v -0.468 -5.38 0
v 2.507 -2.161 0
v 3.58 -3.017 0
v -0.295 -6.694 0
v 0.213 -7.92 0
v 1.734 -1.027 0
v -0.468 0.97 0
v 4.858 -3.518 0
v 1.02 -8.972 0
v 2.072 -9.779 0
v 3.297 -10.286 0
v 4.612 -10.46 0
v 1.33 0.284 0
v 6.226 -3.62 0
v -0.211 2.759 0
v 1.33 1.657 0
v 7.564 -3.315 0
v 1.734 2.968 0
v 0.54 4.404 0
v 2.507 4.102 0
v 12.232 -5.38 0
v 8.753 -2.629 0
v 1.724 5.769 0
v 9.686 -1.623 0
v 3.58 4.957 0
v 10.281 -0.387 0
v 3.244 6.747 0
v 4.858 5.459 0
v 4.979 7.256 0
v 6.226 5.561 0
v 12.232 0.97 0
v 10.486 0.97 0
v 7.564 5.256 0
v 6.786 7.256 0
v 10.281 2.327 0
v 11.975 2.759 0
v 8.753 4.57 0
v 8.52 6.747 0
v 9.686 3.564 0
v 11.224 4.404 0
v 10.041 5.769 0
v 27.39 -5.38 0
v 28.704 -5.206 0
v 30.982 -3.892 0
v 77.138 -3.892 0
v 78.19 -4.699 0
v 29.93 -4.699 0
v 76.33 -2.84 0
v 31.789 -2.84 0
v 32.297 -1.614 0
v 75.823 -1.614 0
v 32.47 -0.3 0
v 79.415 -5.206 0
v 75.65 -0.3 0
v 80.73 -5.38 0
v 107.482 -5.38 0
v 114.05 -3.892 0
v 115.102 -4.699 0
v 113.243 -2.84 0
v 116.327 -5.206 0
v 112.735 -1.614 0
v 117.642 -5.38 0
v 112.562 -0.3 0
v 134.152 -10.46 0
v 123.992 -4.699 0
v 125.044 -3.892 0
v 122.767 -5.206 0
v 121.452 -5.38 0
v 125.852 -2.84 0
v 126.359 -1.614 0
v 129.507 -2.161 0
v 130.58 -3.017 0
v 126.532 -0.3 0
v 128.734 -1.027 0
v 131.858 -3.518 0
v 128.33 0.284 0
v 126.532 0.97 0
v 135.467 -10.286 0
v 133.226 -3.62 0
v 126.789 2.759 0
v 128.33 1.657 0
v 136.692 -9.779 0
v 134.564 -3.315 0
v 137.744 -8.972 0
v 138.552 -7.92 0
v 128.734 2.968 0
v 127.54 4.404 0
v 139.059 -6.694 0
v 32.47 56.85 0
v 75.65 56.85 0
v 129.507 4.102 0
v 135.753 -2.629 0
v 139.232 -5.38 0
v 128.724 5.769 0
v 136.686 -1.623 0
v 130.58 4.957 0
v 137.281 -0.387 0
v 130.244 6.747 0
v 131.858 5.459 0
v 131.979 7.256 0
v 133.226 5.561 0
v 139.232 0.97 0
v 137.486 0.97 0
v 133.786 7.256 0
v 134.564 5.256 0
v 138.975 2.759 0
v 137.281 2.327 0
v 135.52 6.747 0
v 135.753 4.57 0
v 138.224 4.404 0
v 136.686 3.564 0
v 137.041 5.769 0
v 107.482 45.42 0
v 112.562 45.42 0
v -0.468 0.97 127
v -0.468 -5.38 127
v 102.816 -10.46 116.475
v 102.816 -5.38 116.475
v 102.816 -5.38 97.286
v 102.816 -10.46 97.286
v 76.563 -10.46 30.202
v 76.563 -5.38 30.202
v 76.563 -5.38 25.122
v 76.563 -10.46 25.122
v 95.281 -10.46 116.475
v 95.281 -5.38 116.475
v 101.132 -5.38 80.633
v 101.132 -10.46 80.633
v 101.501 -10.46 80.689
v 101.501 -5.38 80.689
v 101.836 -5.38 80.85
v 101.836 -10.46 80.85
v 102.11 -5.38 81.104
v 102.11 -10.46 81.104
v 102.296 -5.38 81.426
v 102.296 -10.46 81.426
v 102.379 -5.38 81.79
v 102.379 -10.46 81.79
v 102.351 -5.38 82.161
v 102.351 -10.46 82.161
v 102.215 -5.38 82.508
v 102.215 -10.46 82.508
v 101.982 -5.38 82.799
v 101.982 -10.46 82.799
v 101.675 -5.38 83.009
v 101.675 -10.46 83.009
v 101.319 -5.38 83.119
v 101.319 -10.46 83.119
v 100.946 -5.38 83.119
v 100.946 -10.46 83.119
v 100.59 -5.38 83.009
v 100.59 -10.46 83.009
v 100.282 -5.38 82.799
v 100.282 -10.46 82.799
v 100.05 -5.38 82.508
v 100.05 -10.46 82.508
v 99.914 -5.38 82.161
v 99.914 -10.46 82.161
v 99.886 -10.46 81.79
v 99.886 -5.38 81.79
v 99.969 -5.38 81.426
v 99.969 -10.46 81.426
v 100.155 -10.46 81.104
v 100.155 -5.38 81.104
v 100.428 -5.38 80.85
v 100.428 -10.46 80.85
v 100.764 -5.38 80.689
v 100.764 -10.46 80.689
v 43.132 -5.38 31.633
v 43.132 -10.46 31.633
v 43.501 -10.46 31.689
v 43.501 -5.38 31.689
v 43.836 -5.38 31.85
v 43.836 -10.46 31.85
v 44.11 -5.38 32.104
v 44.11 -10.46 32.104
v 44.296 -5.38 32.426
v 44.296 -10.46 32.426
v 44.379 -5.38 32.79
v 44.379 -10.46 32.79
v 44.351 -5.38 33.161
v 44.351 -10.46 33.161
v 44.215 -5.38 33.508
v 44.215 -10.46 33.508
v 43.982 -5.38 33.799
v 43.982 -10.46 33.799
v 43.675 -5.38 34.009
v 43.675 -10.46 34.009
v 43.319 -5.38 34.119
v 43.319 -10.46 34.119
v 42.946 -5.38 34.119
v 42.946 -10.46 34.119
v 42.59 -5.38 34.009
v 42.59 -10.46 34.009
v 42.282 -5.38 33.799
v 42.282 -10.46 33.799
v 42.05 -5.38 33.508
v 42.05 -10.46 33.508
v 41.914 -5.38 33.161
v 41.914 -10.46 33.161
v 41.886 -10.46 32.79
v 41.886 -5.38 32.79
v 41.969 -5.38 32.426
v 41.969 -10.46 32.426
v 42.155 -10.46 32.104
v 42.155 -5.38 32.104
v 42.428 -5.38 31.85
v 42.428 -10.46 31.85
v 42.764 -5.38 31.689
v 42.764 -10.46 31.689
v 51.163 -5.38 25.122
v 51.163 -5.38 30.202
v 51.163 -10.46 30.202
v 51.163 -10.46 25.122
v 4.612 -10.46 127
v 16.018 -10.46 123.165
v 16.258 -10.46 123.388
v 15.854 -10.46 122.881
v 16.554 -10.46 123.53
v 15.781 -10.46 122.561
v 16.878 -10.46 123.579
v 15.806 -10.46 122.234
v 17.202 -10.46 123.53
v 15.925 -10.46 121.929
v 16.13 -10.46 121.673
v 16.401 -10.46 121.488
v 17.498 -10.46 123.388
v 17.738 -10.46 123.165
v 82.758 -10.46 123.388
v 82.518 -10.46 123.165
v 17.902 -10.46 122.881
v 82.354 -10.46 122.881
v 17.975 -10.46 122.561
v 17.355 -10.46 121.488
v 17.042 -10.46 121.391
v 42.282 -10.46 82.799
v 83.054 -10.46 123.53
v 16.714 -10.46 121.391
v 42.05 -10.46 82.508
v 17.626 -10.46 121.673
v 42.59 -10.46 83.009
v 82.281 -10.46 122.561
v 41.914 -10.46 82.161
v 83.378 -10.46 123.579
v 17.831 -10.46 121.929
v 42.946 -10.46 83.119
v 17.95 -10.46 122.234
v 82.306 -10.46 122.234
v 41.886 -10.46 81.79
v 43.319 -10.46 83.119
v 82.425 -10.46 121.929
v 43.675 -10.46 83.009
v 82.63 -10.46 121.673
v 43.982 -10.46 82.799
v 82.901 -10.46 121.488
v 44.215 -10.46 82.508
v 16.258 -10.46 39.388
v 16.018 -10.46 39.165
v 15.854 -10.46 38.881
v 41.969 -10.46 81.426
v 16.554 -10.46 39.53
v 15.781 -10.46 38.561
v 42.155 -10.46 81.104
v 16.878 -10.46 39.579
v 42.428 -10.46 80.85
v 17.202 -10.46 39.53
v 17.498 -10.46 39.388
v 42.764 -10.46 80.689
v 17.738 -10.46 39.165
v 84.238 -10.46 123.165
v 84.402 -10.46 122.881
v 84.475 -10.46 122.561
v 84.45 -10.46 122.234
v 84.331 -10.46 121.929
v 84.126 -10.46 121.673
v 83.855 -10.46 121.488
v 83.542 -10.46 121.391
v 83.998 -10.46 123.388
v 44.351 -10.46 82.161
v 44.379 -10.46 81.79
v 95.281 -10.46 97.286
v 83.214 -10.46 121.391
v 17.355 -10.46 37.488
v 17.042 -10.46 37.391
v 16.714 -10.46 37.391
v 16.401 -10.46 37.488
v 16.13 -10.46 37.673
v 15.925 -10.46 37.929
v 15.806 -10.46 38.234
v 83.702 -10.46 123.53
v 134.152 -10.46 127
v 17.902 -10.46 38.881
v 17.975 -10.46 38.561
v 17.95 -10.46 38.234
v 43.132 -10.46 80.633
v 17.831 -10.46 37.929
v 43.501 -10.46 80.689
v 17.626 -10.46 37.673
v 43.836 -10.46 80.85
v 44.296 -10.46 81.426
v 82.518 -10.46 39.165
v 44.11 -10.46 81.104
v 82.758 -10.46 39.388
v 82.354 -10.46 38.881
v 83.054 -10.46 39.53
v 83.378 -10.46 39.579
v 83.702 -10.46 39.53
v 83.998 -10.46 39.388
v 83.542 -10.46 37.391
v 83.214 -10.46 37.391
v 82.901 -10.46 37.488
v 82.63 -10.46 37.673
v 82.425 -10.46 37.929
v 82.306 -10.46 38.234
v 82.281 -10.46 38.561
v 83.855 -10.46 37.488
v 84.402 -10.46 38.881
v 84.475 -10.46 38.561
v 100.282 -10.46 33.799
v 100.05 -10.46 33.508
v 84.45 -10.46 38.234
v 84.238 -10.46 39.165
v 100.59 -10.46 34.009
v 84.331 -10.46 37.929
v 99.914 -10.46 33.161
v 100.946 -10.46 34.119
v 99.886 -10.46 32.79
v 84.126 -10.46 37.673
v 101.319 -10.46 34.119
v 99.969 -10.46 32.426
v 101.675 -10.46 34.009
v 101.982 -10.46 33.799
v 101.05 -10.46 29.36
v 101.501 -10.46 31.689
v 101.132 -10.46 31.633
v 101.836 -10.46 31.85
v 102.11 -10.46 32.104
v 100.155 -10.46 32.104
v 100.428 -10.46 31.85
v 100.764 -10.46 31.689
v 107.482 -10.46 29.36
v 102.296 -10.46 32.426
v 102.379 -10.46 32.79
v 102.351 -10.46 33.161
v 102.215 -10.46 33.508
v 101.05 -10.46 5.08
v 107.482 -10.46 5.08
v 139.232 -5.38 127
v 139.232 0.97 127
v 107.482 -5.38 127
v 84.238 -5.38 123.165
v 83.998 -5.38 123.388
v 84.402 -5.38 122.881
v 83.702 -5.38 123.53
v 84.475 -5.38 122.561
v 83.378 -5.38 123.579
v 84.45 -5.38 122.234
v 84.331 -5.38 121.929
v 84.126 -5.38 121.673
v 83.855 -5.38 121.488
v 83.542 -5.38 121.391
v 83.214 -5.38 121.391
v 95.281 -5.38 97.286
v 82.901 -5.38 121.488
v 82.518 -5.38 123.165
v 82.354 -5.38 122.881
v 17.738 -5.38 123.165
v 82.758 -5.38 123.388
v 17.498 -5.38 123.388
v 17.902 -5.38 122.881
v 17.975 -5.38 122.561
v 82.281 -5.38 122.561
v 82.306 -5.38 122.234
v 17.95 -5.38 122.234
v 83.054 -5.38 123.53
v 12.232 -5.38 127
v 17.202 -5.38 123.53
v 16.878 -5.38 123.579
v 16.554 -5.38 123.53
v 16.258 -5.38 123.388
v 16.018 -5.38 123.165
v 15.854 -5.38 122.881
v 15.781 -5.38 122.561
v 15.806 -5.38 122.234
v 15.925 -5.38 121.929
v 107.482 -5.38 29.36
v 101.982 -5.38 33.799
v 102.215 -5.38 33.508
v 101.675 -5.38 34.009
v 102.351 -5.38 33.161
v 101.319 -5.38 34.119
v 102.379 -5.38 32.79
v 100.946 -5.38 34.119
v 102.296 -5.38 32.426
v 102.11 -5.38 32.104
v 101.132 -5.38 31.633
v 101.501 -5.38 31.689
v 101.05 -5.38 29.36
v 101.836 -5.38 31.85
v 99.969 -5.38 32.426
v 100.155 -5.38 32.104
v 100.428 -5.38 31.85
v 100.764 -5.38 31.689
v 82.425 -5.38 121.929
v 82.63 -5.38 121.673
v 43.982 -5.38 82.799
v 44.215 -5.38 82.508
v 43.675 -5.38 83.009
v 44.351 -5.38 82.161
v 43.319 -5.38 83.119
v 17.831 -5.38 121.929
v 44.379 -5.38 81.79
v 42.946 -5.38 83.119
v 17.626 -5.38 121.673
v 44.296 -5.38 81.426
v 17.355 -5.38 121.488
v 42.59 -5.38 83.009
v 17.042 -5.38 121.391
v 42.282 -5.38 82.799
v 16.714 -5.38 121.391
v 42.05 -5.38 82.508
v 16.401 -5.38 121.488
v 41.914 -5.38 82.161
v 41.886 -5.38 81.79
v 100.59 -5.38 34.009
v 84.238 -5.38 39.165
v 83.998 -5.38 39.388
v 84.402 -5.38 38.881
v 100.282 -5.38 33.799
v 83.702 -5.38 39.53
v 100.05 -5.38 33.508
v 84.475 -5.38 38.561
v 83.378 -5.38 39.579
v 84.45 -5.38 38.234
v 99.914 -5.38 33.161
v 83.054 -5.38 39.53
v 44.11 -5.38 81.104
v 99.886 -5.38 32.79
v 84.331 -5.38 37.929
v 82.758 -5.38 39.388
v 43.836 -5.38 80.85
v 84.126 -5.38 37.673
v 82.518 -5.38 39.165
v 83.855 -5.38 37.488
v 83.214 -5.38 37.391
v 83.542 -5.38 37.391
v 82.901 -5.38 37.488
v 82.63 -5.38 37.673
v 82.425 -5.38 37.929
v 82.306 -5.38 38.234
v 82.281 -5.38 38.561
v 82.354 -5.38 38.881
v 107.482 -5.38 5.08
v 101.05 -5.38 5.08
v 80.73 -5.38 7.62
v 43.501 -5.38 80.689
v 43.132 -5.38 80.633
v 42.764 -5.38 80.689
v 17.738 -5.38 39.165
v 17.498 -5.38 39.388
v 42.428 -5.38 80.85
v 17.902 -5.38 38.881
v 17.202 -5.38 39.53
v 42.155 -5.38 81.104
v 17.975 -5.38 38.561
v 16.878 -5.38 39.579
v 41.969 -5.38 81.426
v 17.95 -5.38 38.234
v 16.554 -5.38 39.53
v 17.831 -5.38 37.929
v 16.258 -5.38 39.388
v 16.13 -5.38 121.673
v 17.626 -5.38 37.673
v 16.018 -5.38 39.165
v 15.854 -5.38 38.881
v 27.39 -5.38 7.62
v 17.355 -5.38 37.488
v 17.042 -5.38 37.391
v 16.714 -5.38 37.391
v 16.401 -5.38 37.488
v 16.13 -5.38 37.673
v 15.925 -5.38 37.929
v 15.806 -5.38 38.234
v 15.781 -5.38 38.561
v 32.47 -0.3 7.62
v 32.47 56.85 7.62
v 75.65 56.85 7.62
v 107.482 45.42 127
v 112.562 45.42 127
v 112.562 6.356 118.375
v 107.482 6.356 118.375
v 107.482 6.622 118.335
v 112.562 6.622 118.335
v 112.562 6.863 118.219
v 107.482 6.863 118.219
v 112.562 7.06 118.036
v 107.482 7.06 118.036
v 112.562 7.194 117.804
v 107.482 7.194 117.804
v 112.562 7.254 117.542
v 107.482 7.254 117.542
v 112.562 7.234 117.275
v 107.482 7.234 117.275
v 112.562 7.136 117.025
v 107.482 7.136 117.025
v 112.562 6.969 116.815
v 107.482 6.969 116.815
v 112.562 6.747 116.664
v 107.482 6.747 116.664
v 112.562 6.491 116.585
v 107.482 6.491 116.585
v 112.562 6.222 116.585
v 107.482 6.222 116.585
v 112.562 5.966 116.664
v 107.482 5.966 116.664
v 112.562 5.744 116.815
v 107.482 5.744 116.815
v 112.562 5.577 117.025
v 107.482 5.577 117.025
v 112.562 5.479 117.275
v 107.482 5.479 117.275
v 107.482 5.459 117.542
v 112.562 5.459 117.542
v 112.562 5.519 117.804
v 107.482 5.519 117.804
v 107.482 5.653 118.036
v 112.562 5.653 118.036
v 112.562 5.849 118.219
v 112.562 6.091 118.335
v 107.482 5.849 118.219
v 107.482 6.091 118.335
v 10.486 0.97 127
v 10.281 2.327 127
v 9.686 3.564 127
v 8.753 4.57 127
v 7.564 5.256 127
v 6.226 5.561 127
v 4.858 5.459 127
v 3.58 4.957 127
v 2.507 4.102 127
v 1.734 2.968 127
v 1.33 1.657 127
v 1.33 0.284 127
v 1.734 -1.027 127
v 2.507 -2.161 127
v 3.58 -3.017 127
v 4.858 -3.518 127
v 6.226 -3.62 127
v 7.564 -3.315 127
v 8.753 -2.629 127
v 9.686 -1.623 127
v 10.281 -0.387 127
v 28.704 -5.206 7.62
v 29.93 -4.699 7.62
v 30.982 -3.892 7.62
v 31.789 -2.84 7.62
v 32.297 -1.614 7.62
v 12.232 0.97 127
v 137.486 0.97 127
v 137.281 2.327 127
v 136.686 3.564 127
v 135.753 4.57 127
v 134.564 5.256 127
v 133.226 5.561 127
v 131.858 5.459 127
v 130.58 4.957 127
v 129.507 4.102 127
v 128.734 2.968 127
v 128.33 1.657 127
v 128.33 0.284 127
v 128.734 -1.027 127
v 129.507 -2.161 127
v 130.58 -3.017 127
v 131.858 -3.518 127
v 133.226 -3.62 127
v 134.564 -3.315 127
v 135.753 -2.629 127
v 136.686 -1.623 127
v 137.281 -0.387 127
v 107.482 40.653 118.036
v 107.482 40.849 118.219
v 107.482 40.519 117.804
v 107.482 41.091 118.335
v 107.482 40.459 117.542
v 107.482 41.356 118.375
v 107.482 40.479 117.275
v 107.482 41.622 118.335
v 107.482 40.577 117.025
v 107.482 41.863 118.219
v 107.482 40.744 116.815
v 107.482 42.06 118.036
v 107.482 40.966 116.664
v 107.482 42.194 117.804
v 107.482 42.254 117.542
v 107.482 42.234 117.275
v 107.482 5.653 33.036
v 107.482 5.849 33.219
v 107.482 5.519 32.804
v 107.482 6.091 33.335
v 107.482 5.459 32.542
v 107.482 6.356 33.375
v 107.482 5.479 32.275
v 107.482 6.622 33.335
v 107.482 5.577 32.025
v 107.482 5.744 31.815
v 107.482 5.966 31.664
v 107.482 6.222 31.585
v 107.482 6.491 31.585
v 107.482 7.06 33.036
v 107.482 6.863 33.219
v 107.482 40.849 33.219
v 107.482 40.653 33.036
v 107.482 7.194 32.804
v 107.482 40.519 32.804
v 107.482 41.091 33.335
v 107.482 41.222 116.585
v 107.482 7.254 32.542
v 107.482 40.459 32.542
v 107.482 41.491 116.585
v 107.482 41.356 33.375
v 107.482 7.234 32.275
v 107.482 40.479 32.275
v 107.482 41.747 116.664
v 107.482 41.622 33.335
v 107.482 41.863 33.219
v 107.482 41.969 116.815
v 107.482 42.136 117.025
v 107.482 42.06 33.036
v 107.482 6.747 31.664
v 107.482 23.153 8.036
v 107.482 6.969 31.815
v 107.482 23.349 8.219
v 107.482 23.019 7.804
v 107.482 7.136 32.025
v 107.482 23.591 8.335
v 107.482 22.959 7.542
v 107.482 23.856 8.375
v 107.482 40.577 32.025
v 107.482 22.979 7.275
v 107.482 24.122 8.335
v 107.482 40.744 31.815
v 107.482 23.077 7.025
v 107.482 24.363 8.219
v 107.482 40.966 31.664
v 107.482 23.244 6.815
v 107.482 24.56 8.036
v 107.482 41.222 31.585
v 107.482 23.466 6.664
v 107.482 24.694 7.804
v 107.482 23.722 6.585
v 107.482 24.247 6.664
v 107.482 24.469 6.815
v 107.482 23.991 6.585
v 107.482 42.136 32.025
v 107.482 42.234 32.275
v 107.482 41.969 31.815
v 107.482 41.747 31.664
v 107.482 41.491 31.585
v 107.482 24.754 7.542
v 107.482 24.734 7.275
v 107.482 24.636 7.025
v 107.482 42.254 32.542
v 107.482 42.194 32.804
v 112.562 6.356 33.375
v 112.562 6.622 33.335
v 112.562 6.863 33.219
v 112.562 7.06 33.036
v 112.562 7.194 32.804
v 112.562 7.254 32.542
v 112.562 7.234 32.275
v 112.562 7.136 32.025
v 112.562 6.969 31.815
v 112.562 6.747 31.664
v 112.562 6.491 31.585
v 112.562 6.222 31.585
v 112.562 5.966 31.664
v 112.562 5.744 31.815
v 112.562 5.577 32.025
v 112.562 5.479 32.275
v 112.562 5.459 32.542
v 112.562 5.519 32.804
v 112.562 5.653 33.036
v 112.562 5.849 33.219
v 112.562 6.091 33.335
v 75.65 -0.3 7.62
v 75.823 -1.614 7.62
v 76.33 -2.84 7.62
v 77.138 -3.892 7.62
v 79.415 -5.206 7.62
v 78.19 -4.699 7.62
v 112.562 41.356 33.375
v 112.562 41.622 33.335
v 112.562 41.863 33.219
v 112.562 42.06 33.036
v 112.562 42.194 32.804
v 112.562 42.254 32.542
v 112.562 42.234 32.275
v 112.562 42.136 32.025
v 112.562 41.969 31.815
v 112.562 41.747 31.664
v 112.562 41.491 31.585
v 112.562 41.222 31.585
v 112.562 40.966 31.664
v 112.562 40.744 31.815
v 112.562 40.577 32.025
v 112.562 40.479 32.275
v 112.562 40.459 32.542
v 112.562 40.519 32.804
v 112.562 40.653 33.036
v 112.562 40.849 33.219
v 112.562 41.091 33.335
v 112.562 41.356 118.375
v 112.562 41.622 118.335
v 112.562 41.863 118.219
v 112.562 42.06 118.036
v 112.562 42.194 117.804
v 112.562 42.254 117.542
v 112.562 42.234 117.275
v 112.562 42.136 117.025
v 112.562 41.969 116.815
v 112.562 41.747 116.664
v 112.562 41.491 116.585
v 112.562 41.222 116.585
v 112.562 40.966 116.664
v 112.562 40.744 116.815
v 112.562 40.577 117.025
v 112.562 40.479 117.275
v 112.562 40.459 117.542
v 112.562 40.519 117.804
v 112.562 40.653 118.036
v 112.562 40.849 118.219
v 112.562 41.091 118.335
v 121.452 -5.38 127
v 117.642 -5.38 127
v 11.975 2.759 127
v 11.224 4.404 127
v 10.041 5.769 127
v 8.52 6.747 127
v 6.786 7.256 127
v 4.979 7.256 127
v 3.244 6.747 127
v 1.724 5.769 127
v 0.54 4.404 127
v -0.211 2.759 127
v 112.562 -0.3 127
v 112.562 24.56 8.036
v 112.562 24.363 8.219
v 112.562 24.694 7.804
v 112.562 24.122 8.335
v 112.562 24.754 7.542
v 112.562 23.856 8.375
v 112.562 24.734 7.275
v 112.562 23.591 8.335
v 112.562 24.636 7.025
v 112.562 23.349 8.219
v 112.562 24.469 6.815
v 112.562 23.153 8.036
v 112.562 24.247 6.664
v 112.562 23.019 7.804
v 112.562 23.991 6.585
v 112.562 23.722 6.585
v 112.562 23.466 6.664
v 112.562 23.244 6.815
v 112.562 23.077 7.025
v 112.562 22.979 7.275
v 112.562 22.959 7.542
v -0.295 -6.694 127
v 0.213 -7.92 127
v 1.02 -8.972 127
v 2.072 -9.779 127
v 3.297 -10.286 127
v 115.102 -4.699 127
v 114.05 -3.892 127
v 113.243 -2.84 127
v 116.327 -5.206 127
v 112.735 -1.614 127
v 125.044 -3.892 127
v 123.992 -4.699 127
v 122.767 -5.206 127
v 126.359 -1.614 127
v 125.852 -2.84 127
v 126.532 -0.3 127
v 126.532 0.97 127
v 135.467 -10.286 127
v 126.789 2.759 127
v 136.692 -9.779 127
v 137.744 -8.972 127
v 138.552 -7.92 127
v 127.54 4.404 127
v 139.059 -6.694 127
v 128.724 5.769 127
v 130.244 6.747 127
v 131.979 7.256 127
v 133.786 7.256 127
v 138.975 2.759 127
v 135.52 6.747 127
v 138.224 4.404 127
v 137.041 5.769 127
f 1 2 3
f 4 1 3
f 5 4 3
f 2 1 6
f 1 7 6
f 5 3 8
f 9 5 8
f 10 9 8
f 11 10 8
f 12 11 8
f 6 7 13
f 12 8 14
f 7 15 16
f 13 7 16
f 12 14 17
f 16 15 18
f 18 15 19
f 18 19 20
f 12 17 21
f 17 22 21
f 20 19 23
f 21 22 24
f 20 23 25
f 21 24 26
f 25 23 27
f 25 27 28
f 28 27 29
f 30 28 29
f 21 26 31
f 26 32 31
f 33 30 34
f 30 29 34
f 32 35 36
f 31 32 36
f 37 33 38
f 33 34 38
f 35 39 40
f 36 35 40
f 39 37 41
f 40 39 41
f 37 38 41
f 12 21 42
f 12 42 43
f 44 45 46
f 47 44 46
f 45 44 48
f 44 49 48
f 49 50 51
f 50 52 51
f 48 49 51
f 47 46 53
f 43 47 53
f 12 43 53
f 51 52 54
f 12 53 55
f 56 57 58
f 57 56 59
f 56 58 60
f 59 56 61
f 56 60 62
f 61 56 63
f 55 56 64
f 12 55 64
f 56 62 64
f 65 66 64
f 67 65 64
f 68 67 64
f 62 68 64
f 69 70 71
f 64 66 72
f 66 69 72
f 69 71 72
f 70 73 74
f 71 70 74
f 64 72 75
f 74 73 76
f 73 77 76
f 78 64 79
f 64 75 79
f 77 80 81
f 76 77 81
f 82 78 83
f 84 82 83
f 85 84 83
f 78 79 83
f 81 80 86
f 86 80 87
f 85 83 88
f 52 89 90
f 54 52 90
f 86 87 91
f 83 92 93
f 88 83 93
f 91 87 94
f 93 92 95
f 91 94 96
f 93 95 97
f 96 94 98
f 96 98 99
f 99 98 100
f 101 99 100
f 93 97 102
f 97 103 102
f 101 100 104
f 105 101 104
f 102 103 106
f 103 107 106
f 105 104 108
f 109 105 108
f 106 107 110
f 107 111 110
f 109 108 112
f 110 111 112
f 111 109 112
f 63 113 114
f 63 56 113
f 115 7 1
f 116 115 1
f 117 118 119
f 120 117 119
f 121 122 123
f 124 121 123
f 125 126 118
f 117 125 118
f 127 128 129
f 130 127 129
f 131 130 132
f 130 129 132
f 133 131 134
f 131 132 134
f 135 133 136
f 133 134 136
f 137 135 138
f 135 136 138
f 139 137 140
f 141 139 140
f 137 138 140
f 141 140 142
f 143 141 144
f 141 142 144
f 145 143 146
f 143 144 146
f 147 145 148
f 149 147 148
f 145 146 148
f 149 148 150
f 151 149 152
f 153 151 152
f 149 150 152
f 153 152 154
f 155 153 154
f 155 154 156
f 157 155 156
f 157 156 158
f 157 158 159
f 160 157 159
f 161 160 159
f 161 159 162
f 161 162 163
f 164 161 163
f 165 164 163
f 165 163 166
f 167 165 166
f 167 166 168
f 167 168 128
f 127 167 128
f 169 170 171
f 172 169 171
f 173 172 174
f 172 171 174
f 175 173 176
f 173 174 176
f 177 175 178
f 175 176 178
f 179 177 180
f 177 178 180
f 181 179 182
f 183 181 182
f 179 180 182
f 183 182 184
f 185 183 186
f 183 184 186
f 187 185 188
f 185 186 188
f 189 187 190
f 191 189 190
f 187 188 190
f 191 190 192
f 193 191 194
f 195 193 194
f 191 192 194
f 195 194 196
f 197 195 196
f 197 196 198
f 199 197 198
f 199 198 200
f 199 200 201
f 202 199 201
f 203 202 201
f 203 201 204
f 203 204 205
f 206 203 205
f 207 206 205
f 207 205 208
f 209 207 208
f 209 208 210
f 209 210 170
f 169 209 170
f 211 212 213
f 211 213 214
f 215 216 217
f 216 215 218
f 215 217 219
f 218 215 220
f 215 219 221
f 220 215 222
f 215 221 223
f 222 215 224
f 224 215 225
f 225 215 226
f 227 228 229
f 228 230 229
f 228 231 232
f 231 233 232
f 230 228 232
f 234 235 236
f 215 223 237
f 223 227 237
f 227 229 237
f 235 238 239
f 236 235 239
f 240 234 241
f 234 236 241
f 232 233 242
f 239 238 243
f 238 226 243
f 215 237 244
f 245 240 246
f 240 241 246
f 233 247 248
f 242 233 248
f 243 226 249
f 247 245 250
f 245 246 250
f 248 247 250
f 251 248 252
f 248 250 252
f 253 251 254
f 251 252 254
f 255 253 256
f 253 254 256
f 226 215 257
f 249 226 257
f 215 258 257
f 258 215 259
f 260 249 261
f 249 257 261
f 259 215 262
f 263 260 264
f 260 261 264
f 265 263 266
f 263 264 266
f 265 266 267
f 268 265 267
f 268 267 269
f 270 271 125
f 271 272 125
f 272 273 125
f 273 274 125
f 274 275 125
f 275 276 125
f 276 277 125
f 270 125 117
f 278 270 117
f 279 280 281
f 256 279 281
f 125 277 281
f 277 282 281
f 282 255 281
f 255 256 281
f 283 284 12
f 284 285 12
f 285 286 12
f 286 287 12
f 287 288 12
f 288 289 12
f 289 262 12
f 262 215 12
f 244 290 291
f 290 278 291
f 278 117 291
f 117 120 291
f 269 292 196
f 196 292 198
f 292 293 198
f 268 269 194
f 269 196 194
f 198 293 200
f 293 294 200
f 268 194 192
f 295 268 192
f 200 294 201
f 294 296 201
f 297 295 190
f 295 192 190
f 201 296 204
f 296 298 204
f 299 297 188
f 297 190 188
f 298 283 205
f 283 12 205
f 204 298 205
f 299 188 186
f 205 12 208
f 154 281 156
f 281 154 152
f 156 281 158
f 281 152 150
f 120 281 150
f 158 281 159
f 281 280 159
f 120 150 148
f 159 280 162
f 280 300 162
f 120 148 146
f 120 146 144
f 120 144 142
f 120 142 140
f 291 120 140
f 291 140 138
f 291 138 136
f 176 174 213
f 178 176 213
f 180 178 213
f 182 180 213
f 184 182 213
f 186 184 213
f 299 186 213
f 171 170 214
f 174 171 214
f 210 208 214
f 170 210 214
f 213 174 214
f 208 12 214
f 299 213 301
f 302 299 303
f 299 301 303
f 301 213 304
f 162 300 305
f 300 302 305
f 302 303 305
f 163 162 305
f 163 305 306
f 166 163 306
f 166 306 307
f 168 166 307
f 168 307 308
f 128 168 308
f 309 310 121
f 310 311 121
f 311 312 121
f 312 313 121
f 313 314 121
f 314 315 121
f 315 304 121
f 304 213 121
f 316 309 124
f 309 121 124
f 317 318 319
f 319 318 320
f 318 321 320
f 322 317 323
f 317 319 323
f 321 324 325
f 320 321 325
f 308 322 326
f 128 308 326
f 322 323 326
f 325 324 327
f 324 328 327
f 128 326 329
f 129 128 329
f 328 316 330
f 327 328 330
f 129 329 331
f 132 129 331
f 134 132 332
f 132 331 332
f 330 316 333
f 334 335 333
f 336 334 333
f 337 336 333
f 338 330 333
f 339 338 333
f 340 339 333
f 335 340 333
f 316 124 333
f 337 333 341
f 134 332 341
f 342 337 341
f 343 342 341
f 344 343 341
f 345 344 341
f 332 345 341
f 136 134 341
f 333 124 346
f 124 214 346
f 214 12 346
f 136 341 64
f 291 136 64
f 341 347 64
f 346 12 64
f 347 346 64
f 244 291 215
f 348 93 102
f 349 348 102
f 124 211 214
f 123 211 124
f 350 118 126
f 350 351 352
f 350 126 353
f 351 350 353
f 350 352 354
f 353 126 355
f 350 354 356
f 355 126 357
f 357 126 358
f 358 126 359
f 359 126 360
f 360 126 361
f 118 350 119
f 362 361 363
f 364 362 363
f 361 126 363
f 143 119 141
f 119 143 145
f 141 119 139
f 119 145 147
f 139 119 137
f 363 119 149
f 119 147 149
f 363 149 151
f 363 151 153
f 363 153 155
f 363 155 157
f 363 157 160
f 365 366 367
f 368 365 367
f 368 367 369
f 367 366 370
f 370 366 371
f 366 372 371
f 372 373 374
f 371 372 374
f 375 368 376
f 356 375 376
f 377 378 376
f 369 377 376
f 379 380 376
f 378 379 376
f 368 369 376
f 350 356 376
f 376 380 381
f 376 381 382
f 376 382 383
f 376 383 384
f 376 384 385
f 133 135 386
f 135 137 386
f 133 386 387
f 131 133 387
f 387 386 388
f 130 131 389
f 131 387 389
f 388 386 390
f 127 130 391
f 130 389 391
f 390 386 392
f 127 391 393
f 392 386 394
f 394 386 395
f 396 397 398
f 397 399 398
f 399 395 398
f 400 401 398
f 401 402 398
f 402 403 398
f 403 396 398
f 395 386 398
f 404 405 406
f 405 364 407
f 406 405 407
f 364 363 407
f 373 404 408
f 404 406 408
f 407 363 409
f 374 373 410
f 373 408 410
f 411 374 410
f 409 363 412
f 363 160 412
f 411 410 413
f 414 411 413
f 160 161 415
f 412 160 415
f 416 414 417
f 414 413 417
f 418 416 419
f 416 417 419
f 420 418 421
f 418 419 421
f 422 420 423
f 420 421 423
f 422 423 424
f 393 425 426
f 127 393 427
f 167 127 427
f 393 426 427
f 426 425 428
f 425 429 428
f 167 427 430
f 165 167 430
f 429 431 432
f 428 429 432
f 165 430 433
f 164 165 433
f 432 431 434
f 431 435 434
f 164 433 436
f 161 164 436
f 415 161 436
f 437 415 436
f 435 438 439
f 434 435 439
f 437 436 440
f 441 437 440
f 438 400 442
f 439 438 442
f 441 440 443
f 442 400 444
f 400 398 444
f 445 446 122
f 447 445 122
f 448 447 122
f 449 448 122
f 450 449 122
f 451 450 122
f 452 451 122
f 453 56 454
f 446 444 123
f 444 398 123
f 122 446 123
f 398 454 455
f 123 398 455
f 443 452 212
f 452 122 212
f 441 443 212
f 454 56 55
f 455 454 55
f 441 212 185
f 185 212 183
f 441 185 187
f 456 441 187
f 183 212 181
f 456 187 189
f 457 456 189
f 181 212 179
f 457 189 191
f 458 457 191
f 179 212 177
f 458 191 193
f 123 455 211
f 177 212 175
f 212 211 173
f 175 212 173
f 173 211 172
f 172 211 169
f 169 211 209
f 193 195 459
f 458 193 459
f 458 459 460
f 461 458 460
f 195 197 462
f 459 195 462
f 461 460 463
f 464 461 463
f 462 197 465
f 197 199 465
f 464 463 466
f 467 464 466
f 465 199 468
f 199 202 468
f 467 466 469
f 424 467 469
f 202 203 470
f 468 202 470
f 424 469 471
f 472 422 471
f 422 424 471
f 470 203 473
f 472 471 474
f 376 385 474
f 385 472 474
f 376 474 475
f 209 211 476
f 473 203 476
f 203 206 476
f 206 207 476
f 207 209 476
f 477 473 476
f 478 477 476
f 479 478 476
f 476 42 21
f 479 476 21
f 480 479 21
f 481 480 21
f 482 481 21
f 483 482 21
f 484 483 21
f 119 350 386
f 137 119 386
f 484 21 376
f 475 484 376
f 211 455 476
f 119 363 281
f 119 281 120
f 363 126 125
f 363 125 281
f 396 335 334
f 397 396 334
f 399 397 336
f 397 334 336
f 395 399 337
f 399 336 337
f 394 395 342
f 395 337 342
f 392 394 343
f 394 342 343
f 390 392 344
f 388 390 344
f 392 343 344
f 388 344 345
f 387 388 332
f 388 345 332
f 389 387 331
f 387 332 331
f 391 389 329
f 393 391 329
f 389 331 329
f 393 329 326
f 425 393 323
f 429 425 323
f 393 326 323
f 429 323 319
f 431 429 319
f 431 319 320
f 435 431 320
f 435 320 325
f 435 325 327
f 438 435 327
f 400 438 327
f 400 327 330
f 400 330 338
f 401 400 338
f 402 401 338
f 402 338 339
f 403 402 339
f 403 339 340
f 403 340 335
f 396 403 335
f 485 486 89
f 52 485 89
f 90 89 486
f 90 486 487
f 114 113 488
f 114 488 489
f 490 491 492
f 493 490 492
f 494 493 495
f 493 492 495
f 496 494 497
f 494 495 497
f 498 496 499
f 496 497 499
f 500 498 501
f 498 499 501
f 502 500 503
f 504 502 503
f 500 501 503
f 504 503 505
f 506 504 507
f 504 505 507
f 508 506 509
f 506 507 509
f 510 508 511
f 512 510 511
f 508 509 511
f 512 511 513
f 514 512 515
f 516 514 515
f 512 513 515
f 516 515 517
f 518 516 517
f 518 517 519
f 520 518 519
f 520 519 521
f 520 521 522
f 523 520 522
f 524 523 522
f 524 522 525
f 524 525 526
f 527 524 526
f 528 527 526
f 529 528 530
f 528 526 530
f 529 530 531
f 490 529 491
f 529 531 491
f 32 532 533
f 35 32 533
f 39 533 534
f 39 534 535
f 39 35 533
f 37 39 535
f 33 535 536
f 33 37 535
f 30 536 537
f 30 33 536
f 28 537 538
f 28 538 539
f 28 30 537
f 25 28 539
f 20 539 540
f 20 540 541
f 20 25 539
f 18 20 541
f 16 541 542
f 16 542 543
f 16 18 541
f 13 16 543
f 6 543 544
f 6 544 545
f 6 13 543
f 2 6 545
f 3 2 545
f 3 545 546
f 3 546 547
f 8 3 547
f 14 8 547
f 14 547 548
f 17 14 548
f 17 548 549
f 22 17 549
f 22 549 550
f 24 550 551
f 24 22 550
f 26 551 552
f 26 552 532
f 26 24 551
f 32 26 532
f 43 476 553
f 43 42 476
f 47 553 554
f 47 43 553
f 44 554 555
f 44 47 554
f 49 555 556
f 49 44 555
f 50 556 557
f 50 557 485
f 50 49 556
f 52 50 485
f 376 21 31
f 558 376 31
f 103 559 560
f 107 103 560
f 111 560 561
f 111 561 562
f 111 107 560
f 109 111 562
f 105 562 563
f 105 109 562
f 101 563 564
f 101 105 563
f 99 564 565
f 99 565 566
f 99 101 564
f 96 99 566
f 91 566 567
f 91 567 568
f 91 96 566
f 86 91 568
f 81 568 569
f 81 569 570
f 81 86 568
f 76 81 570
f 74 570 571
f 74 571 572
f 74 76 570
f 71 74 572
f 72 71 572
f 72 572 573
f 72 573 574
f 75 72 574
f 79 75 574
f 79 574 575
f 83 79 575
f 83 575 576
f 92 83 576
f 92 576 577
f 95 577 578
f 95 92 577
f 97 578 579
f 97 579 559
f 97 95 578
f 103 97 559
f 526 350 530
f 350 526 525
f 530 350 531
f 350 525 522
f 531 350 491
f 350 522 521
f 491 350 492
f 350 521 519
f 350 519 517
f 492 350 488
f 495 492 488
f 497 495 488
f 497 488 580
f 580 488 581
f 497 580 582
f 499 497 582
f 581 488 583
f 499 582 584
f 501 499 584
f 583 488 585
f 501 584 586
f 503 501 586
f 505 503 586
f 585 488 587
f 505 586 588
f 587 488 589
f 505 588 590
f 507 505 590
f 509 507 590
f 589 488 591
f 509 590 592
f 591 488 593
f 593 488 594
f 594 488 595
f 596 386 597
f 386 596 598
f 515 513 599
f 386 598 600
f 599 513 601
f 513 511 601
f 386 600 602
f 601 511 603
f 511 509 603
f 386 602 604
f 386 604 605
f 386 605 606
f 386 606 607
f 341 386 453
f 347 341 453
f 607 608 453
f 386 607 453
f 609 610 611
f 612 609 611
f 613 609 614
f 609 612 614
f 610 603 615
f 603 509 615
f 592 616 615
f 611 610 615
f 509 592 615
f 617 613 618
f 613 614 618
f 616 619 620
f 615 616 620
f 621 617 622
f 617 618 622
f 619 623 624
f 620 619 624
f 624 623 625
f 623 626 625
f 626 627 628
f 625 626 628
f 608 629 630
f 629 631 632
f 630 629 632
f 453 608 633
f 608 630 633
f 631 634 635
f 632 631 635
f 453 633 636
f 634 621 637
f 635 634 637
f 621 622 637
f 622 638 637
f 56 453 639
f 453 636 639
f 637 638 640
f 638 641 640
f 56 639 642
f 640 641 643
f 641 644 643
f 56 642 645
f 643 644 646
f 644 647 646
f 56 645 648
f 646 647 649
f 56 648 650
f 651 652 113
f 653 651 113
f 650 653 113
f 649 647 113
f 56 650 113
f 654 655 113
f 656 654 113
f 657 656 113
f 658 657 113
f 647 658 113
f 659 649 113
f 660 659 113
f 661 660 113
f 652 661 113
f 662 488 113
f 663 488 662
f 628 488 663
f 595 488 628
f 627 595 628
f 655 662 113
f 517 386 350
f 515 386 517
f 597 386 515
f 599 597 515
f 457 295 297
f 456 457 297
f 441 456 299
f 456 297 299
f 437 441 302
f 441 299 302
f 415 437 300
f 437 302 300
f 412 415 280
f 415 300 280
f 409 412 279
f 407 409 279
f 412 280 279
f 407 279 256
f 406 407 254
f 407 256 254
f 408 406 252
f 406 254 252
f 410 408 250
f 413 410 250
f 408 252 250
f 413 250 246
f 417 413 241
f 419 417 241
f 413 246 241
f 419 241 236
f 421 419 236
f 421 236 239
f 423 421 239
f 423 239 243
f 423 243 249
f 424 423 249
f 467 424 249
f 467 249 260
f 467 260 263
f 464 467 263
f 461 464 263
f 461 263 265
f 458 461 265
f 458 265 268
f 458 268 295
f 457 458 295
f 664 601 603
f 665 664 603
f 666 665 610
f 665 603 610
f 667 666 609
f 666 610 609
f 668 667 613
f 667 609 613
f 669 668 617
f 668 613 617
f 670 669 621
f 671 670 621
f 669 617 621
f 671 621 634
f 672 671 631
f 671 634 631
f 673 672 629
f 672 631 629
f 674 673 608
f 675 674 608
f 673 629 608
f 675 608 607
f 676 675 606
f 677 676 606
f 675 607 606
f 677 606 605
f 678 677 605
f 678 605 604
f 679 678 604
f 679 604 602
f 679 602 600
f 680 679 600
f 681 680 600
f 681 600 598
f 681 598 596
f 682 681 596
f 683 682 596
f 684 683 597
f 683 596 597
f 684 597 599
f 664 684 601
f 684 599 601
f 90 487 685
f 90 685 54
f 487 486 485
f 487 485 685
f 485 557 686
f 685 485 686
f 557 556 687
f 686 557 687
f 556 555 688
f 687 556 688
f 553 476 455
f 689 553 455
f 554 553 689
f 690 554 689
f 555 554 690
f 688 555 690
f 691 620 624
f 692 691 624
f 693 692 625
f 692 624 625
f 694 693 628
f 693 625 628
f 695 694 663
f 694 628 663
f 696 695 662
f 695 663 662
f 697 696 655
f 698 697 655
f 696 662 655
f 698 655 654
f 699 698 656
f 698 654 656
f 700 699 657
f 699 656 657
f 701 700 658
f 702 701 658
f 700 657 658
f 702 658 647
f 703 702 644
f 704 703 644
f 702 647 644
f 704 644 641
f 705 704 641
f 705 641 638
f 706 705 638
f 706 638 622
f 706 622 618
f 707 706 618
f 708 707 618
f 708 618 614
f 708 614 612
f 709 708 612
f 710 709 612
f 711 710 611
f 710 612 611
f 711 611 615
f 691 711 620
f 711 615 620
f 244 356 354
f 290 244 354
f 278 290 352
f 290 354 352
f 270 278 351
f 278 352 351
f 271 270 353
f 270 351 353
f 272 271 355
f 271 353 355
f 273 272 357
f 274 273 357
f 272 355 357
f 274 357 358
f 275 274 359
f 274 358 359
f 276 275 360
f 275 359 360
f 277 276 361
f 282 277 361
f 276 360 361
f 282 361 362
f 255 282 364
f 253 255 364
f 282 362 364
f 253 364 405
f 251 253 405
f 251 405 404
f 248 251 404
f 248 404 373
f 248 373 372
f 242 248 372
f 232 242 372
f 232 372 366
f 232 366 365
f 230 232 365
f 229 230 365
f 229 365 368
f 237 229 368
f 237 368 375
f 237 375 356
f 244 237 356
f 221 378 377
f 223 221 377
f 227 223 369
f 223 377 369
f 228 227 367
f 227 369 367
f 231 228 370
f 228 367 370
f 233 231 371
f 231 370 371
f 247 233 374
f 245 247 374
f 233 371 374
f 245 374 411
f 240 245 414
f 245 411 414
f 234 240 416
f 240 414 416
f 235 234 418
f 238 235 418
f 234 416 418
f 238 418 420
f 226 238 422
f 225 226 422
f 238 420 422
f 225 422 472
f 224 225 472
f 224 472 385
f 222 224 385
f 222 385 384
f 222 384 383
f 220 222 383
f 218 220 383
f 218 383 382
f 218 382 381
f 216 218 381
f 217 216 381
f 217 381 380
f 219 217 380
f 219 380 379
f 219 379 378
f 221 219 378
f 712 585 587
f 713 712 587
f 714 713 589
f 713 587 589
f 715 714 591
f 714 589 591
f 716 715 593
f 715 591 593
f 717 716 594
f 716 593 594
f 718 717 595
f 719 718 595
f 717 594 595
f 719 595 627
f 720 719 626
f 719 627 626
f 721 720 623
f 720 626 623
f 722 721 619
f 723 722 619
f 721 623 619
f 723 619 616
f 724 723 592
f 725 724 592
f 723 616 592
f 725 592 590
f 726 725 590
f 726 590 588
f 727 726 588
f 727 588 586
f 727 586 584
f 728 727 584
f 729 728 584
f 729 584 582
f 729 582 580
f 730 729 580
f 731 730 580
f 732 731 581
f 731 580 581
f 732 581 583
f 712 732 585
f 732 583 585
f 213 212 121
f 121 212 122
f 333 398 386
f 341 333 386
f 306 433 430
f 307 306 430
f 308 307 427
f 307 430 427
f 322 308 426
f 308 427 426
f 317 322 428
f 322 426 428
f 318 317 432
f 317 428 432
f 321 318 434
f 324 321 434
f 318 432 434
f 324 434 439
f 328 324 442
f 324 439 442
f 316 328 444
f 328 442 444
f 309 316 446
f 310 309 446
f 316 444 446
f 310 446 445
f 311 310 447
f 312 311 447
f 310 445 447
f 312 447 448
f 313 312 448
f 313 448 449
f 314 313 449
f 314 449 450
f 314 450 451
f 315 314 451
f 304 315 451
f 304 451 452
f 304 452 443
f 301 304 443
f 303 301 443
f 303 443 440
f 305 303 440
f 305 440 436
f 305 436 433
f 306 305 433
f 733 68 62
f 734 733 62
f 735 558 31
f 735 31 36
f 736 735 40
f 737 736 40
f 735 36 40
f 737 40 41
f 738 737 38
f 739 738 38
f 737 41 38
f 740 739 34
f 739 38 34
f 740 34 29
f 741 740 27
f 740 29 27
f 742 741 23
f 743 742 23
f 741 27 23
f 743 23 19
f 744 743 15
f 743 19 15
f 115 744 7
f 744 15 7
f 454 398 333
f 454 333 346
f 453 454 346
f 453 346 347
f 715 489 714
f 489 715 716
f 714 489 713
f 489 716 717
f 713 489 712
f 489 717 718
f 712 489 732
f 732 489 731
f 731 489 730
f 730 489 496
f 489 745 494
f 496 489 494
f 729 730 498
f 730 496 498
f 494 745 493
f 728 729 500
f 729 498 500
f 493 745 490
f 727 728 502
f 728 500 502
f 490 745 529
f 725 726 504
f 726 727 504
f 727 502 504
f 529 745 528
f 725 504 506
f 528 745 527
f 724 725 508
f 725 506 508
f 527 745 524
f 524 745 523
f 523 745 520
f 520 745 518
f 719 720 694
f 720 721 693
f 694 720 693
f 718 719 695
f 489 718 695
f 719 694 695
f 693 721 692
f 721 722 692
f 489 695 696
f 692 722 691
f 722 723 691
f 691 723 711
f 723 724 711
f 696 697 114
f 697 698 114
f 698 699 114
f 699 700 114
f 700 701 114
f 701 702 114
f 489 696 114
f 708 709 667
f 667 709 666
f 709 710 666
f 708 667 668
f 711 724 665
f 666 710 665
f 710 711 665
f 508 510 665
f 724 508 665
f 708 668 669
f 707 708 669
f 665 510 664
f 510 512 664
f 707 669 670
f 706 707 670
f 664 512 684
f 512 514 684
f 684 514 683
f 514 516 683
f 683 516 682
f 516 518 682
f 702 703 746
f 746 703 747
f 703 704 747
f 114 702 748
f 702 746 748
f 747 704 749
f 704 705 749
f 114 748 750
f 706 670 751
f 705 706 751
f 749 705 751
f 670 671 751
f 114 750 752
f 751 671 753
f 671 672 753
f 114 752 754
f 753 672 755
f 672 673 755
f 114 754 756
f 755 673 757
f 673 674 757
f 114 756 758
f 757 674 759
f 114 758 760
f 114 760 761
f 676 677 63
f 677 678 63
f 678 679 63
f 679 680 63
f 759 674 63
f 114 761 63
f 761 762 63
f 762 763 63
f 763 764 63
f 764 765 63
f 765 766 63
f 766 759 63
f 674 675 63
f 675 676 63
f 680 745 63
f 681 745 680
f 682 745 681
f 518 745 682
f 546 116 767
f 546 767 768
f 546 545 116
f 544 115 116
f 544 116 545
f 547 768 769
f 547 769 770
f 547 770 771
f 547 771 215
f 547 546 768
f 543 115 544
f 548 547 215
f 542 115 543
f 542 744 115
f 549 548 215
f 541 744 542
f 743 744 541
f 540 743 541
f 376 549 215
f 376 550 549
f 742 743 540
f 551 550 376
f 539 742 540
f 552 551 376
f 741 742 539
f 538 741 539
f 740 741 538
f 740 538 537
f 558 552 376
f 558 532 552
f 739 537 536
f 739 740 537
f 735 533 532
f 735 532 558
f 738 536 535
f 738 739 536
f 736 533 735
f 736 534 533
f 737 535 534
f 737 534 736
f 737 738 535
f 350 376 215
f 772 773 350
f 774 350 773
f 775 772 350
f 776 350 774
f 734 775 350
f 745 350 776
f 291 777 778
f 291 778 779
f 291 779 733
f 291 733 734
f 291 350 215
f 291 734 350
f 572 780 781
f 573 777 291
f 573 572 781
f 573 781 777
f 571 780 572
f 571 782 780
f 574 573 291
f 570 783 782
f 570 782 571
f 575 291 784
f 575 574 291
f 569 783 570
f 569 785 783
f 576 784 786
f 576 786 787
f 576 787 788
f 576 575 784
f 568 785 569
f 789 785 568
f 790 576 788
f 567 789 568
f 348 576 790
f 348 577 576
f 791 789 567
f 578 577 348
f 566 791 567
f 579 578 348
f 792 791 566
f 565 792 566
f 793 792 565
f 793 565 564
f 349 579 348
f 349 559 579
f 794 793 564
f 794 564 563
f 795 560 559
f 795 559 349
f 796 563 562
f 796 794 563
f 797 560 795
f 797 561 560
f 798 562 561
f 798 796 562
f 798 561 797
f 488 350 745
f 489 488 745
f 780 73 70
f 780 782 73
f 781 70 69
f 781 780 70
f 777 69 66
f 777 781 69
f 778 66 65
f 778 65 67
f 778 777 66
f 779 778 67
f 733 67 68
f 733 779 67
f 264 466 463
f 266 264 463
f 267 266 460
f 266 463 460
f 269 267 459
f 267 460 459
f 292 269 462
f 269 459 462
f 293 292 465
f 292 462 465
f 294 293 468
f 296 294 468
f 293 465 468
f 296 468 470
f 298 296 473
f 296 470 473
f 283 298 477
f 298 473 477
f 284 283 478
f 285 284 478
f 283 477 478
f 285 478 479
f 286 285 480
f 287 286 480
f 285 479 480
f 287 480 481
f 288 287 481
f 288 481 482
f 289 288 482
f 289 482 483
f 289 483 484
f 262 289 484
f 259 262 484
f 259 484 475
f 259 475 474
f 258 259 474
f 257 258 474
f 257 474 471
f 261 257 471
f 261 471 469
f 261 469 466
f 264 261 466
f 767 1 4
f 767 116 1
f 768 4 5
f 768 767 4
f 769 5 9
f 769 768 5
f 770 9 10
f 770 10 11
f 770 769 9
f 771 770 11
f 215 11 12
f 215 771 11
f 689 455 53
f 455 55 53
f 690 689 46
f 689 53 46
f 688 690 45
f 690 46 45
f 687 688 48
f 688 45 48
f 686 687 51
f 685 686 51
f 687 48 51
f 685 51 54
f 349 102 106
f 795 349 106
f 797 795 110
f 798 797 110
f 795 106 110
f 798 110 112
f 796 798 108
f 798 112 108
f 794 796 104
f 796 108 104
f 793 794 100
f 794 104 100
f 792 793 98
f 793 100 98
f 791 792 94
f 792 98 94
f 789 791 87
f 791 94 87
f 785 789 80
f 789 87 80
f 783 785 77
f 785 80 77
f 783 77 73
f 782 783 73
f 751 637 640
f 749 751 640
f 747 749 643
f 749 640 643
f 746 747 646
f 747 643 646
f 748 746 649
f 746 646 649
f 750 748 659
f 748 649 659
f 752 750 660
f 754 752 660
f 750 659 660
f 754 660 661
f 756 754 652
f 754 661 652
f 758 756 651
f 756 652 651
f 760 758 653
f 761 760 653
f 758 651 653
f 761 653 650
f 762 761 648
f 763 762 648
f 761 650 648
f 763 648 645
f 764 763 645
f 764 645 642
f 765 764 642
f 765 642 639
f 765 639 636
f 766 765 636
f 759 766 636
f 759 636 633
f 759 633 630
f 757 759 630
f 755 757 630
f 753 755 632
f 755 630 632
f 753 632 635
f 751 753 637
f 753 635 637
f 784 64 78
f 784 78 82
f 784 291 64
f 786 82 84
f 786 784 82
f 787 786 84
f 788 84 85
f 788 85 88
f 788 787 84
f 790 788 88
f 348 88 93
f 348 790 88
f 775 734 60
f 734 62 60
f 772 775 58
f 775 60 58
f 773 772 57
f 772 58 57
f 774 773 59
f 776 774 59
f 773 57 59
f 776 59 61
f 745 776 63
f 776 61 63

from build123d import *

# Parameters (mm, degrees)
SKETCH1_R           = 4.60375
BOSS_EXTRUDE1_DEPTH = 127
SKETCH3_R           = 1.249999967
CUT_EXTRUDE3_DEPTH  = 190.290136172
SKETCH4_R           = 1.1
CUT_EXTRUDE4_DEPTH  = 189.880695817
SKETCH5_W           = 5.08
SKETCH5_H           = 127
BOSS_EXTRUDE2_DEPTH = 50.8
SKETCH6_R           = 0.899999978
CUT_EXTRUDE5_DEPTH  = 5.08
SKETCH7_W           = 6.432611175
SKETCH7_H           = 24.280435839
SKETCH7_W_2         = 25.4
SKETCH7_H_2         = 5.08
SKETCH7_W_3         = 7.534248642
SKETCH7_H_3         = 19.188789511
CUT_EXTRUDE6_DEPTH  = 196.180089282
FILLET1_R           = 5.08
SKETCH8_W           = 43.18
SKETCH8_H           = 7.62
BOSS_EXTRUDE3_DEPTH = 62.23
FILLET2_R           = 5.08


with BuildPart() as part:
    # Sketch1 → Boss-Extrude1 (new body)
    with BuildSketch(Plane.XY):
        with BuildLine():
            Line((-0.467721946, 0.970453027), (-0.467721946, -10.459546973))
            Line((-0.467721946, -10.459546973), (139.232278054, -10.459546973))
            Line((139.232278054, -10.459546973), (139.232278054, 0.970453027))
            ThreePointArc((139.232278054, 0.970453027), (132.882278054, 7.320453027), (126.532278054, 0.970453027))
            Line((126.532278054, 0.970453027), (126.532278054, -5.379546973))
            Line((126.532278054, -5.379546973), (12.232278054, -5.379546973))
            Line((12.232278054, -5.379546973), (12.232278054, 0.970453027))
            ThreePointArc((12.232278054, 0.970453027), (5.882278054, 7.320453027), (-0.467721946, 0.970453027))
        make_face()
        with Locations((5.882278054, 0.970453027)):
            Circle(SKETCH1_R, mode=Mode.SUBTRACT)
        with Locations((132.882278054, 0.970453027)):
            Circle(SKETCH1_R, mode=Mode.SUBTRACT)
    extrude(amount=BOSS_EXTRUDE1_DEPTH)

    # Sketch3 → Cut-Extrude3 (cut, through all)
    with BuildSketch(Plane.XZ.offset(10.459546973)):
        with Locations(Location((101.132278054, 81.883033078, 0), (0, 0, 270))):
            Circle(SKETCH3_R)
        with Locations(Location((43.132278054, 81.883033078, 0), (0, 0, 270))):
            Circle(SKETCH3_R)
        with Locations(Location((43.132278054, 32.883033078, 0), (0, 0, 270))):
            Circle(SKETCH3_R)
        with Locations(Location((101.132278054, 32.883033078, 0), (0, 0, 270))):
            Circle(SKETCH3_R)
    extrude(amount=-CUT_EXTRUDE3_DEPTH, mode=Mode.SUBTRACT)

    # Sketch4 → Cut-Extrude4 (cut, through all)
    with BuildSketch(Plane(origin=(0, -5.379546973, 0), x_dir=(1, 0, 0), z_dir=(0, 1, 0))):
        with Locations(Location((16.877982827, -38.47904026, 0), (0, 0, 270))):
            Circle(SKETCH4_R)
        with Locations(Location((16.877982827, -122.479040154, 0), (0, 0, 270))):
            Circle(SKETCH4_R)
        with Locations(Location((83.377982923, -38.47904026, 0), (0, 0, 270))):
            Circle(SKETCH4_R)
        with Locations(Location((83.377982923, -122.479040154, 0), (0, 0, 270))):
            Circle(SKETCH4_R)
    extrude(amount=-CUT_EXTRUDE4_DEPTH, mode=Mode.SUBTRACT)

    # Sketch5 → Boss-Extrude2 (add)
    with BuildSketch(Plane(origin=(0, -5.379546973, 0), x_dir=(1, 0, 0), z_dir=(0, 1, 0))):
        with Locations((110.022278054, -63.5)):
            Rectangle(SKETCH5_W, SKETCH5_H)
    extrude(amount=BOSS_EXTRUDE2_DEPTH)

    # Sketch6 → Cut-Extrude5 (cut)
    with BuildSketch(Plane.ZY.offset(-107.482278054)):
        with Locations((32.475000074, 6.356452923)):
            Circle(SKETCH6_R)
        with Locations((32.475000074, 41.356453027)):
            Circle(SKETCH6_R)
        with Locations((117.475, 6.356452923)):
            Circle(SKETCH6_R)
        with Locations((117.475, 41.356453027)):
            Circle(SKETCH6_R)
        with Locations((7.475000036, 23.856452975)):
            Circle(SKETCH6_R)
    extrude(amount=-CUT_EXTRUDE5_DEPTH, mode=Mode.SUBTRACT)

    # Sketch7 → Cut-Extrude6 (cut, through all)
    with BuildSketch(Plane(origin=(0, -5.379546973, 0), x_dir=(1, 0, 0), z_dir=(0, 1, 0))):
        with Locations((104.265972467, -17.22021792)):
            Rectangle(SKETCH7_W, SKETCH7_H)
        with Locations((63.863358791, -27.662420978)):
            Rectangle(SKETCH7_W_2, SKETCH7_H_2)
        with Locations((99.048382084, -106.880791012)):
            Rectangle(SKETCH7_W_3, SKETCH7_H_3)
    extrude(amount=-CUT_EXTRUDE6_DEPTH, mode=Mode.SUBTRACT)

    # Fillet1
    fillet1_edges = [part.edges().sort_by_distance(p)[0] for p in [
        (126.532278054, -5.379546973, 63.5),
        (139.232278054, -10.459546973, 63.5),
        (-0.467721946, -10.459546973, 63.5),
        (112.562278054, -5.379546973, 63.5),
    ]]
    fillet(fillet1_edges, radius=FILLET1_R)

    # Sketch8 → Boss-Extrude3 (add)
    with BuildSketch(Plane(origin=(0, -5.379546973, 0), x_dir=(1, 0, 0), z_dir=(0, 1, 0))):
        with Locations((54.059666879, -3.81)):
            Rectangle(SKETCH8_W, SKETCH8_H)
    extrude(amount=BOSS_EXTRUDE3_DEPTH)

    # Fillet2
    fillet2_edges = [part.edges().sort_by_distance(p)[0] for p in [
        (32.469666879, -5.379546973, 3.81),
        (75.649666879, -5.379546973, 3.81),
    ]]
    fillet(fillet2_edges, radius=FILLET2_R)


solid = part.part
